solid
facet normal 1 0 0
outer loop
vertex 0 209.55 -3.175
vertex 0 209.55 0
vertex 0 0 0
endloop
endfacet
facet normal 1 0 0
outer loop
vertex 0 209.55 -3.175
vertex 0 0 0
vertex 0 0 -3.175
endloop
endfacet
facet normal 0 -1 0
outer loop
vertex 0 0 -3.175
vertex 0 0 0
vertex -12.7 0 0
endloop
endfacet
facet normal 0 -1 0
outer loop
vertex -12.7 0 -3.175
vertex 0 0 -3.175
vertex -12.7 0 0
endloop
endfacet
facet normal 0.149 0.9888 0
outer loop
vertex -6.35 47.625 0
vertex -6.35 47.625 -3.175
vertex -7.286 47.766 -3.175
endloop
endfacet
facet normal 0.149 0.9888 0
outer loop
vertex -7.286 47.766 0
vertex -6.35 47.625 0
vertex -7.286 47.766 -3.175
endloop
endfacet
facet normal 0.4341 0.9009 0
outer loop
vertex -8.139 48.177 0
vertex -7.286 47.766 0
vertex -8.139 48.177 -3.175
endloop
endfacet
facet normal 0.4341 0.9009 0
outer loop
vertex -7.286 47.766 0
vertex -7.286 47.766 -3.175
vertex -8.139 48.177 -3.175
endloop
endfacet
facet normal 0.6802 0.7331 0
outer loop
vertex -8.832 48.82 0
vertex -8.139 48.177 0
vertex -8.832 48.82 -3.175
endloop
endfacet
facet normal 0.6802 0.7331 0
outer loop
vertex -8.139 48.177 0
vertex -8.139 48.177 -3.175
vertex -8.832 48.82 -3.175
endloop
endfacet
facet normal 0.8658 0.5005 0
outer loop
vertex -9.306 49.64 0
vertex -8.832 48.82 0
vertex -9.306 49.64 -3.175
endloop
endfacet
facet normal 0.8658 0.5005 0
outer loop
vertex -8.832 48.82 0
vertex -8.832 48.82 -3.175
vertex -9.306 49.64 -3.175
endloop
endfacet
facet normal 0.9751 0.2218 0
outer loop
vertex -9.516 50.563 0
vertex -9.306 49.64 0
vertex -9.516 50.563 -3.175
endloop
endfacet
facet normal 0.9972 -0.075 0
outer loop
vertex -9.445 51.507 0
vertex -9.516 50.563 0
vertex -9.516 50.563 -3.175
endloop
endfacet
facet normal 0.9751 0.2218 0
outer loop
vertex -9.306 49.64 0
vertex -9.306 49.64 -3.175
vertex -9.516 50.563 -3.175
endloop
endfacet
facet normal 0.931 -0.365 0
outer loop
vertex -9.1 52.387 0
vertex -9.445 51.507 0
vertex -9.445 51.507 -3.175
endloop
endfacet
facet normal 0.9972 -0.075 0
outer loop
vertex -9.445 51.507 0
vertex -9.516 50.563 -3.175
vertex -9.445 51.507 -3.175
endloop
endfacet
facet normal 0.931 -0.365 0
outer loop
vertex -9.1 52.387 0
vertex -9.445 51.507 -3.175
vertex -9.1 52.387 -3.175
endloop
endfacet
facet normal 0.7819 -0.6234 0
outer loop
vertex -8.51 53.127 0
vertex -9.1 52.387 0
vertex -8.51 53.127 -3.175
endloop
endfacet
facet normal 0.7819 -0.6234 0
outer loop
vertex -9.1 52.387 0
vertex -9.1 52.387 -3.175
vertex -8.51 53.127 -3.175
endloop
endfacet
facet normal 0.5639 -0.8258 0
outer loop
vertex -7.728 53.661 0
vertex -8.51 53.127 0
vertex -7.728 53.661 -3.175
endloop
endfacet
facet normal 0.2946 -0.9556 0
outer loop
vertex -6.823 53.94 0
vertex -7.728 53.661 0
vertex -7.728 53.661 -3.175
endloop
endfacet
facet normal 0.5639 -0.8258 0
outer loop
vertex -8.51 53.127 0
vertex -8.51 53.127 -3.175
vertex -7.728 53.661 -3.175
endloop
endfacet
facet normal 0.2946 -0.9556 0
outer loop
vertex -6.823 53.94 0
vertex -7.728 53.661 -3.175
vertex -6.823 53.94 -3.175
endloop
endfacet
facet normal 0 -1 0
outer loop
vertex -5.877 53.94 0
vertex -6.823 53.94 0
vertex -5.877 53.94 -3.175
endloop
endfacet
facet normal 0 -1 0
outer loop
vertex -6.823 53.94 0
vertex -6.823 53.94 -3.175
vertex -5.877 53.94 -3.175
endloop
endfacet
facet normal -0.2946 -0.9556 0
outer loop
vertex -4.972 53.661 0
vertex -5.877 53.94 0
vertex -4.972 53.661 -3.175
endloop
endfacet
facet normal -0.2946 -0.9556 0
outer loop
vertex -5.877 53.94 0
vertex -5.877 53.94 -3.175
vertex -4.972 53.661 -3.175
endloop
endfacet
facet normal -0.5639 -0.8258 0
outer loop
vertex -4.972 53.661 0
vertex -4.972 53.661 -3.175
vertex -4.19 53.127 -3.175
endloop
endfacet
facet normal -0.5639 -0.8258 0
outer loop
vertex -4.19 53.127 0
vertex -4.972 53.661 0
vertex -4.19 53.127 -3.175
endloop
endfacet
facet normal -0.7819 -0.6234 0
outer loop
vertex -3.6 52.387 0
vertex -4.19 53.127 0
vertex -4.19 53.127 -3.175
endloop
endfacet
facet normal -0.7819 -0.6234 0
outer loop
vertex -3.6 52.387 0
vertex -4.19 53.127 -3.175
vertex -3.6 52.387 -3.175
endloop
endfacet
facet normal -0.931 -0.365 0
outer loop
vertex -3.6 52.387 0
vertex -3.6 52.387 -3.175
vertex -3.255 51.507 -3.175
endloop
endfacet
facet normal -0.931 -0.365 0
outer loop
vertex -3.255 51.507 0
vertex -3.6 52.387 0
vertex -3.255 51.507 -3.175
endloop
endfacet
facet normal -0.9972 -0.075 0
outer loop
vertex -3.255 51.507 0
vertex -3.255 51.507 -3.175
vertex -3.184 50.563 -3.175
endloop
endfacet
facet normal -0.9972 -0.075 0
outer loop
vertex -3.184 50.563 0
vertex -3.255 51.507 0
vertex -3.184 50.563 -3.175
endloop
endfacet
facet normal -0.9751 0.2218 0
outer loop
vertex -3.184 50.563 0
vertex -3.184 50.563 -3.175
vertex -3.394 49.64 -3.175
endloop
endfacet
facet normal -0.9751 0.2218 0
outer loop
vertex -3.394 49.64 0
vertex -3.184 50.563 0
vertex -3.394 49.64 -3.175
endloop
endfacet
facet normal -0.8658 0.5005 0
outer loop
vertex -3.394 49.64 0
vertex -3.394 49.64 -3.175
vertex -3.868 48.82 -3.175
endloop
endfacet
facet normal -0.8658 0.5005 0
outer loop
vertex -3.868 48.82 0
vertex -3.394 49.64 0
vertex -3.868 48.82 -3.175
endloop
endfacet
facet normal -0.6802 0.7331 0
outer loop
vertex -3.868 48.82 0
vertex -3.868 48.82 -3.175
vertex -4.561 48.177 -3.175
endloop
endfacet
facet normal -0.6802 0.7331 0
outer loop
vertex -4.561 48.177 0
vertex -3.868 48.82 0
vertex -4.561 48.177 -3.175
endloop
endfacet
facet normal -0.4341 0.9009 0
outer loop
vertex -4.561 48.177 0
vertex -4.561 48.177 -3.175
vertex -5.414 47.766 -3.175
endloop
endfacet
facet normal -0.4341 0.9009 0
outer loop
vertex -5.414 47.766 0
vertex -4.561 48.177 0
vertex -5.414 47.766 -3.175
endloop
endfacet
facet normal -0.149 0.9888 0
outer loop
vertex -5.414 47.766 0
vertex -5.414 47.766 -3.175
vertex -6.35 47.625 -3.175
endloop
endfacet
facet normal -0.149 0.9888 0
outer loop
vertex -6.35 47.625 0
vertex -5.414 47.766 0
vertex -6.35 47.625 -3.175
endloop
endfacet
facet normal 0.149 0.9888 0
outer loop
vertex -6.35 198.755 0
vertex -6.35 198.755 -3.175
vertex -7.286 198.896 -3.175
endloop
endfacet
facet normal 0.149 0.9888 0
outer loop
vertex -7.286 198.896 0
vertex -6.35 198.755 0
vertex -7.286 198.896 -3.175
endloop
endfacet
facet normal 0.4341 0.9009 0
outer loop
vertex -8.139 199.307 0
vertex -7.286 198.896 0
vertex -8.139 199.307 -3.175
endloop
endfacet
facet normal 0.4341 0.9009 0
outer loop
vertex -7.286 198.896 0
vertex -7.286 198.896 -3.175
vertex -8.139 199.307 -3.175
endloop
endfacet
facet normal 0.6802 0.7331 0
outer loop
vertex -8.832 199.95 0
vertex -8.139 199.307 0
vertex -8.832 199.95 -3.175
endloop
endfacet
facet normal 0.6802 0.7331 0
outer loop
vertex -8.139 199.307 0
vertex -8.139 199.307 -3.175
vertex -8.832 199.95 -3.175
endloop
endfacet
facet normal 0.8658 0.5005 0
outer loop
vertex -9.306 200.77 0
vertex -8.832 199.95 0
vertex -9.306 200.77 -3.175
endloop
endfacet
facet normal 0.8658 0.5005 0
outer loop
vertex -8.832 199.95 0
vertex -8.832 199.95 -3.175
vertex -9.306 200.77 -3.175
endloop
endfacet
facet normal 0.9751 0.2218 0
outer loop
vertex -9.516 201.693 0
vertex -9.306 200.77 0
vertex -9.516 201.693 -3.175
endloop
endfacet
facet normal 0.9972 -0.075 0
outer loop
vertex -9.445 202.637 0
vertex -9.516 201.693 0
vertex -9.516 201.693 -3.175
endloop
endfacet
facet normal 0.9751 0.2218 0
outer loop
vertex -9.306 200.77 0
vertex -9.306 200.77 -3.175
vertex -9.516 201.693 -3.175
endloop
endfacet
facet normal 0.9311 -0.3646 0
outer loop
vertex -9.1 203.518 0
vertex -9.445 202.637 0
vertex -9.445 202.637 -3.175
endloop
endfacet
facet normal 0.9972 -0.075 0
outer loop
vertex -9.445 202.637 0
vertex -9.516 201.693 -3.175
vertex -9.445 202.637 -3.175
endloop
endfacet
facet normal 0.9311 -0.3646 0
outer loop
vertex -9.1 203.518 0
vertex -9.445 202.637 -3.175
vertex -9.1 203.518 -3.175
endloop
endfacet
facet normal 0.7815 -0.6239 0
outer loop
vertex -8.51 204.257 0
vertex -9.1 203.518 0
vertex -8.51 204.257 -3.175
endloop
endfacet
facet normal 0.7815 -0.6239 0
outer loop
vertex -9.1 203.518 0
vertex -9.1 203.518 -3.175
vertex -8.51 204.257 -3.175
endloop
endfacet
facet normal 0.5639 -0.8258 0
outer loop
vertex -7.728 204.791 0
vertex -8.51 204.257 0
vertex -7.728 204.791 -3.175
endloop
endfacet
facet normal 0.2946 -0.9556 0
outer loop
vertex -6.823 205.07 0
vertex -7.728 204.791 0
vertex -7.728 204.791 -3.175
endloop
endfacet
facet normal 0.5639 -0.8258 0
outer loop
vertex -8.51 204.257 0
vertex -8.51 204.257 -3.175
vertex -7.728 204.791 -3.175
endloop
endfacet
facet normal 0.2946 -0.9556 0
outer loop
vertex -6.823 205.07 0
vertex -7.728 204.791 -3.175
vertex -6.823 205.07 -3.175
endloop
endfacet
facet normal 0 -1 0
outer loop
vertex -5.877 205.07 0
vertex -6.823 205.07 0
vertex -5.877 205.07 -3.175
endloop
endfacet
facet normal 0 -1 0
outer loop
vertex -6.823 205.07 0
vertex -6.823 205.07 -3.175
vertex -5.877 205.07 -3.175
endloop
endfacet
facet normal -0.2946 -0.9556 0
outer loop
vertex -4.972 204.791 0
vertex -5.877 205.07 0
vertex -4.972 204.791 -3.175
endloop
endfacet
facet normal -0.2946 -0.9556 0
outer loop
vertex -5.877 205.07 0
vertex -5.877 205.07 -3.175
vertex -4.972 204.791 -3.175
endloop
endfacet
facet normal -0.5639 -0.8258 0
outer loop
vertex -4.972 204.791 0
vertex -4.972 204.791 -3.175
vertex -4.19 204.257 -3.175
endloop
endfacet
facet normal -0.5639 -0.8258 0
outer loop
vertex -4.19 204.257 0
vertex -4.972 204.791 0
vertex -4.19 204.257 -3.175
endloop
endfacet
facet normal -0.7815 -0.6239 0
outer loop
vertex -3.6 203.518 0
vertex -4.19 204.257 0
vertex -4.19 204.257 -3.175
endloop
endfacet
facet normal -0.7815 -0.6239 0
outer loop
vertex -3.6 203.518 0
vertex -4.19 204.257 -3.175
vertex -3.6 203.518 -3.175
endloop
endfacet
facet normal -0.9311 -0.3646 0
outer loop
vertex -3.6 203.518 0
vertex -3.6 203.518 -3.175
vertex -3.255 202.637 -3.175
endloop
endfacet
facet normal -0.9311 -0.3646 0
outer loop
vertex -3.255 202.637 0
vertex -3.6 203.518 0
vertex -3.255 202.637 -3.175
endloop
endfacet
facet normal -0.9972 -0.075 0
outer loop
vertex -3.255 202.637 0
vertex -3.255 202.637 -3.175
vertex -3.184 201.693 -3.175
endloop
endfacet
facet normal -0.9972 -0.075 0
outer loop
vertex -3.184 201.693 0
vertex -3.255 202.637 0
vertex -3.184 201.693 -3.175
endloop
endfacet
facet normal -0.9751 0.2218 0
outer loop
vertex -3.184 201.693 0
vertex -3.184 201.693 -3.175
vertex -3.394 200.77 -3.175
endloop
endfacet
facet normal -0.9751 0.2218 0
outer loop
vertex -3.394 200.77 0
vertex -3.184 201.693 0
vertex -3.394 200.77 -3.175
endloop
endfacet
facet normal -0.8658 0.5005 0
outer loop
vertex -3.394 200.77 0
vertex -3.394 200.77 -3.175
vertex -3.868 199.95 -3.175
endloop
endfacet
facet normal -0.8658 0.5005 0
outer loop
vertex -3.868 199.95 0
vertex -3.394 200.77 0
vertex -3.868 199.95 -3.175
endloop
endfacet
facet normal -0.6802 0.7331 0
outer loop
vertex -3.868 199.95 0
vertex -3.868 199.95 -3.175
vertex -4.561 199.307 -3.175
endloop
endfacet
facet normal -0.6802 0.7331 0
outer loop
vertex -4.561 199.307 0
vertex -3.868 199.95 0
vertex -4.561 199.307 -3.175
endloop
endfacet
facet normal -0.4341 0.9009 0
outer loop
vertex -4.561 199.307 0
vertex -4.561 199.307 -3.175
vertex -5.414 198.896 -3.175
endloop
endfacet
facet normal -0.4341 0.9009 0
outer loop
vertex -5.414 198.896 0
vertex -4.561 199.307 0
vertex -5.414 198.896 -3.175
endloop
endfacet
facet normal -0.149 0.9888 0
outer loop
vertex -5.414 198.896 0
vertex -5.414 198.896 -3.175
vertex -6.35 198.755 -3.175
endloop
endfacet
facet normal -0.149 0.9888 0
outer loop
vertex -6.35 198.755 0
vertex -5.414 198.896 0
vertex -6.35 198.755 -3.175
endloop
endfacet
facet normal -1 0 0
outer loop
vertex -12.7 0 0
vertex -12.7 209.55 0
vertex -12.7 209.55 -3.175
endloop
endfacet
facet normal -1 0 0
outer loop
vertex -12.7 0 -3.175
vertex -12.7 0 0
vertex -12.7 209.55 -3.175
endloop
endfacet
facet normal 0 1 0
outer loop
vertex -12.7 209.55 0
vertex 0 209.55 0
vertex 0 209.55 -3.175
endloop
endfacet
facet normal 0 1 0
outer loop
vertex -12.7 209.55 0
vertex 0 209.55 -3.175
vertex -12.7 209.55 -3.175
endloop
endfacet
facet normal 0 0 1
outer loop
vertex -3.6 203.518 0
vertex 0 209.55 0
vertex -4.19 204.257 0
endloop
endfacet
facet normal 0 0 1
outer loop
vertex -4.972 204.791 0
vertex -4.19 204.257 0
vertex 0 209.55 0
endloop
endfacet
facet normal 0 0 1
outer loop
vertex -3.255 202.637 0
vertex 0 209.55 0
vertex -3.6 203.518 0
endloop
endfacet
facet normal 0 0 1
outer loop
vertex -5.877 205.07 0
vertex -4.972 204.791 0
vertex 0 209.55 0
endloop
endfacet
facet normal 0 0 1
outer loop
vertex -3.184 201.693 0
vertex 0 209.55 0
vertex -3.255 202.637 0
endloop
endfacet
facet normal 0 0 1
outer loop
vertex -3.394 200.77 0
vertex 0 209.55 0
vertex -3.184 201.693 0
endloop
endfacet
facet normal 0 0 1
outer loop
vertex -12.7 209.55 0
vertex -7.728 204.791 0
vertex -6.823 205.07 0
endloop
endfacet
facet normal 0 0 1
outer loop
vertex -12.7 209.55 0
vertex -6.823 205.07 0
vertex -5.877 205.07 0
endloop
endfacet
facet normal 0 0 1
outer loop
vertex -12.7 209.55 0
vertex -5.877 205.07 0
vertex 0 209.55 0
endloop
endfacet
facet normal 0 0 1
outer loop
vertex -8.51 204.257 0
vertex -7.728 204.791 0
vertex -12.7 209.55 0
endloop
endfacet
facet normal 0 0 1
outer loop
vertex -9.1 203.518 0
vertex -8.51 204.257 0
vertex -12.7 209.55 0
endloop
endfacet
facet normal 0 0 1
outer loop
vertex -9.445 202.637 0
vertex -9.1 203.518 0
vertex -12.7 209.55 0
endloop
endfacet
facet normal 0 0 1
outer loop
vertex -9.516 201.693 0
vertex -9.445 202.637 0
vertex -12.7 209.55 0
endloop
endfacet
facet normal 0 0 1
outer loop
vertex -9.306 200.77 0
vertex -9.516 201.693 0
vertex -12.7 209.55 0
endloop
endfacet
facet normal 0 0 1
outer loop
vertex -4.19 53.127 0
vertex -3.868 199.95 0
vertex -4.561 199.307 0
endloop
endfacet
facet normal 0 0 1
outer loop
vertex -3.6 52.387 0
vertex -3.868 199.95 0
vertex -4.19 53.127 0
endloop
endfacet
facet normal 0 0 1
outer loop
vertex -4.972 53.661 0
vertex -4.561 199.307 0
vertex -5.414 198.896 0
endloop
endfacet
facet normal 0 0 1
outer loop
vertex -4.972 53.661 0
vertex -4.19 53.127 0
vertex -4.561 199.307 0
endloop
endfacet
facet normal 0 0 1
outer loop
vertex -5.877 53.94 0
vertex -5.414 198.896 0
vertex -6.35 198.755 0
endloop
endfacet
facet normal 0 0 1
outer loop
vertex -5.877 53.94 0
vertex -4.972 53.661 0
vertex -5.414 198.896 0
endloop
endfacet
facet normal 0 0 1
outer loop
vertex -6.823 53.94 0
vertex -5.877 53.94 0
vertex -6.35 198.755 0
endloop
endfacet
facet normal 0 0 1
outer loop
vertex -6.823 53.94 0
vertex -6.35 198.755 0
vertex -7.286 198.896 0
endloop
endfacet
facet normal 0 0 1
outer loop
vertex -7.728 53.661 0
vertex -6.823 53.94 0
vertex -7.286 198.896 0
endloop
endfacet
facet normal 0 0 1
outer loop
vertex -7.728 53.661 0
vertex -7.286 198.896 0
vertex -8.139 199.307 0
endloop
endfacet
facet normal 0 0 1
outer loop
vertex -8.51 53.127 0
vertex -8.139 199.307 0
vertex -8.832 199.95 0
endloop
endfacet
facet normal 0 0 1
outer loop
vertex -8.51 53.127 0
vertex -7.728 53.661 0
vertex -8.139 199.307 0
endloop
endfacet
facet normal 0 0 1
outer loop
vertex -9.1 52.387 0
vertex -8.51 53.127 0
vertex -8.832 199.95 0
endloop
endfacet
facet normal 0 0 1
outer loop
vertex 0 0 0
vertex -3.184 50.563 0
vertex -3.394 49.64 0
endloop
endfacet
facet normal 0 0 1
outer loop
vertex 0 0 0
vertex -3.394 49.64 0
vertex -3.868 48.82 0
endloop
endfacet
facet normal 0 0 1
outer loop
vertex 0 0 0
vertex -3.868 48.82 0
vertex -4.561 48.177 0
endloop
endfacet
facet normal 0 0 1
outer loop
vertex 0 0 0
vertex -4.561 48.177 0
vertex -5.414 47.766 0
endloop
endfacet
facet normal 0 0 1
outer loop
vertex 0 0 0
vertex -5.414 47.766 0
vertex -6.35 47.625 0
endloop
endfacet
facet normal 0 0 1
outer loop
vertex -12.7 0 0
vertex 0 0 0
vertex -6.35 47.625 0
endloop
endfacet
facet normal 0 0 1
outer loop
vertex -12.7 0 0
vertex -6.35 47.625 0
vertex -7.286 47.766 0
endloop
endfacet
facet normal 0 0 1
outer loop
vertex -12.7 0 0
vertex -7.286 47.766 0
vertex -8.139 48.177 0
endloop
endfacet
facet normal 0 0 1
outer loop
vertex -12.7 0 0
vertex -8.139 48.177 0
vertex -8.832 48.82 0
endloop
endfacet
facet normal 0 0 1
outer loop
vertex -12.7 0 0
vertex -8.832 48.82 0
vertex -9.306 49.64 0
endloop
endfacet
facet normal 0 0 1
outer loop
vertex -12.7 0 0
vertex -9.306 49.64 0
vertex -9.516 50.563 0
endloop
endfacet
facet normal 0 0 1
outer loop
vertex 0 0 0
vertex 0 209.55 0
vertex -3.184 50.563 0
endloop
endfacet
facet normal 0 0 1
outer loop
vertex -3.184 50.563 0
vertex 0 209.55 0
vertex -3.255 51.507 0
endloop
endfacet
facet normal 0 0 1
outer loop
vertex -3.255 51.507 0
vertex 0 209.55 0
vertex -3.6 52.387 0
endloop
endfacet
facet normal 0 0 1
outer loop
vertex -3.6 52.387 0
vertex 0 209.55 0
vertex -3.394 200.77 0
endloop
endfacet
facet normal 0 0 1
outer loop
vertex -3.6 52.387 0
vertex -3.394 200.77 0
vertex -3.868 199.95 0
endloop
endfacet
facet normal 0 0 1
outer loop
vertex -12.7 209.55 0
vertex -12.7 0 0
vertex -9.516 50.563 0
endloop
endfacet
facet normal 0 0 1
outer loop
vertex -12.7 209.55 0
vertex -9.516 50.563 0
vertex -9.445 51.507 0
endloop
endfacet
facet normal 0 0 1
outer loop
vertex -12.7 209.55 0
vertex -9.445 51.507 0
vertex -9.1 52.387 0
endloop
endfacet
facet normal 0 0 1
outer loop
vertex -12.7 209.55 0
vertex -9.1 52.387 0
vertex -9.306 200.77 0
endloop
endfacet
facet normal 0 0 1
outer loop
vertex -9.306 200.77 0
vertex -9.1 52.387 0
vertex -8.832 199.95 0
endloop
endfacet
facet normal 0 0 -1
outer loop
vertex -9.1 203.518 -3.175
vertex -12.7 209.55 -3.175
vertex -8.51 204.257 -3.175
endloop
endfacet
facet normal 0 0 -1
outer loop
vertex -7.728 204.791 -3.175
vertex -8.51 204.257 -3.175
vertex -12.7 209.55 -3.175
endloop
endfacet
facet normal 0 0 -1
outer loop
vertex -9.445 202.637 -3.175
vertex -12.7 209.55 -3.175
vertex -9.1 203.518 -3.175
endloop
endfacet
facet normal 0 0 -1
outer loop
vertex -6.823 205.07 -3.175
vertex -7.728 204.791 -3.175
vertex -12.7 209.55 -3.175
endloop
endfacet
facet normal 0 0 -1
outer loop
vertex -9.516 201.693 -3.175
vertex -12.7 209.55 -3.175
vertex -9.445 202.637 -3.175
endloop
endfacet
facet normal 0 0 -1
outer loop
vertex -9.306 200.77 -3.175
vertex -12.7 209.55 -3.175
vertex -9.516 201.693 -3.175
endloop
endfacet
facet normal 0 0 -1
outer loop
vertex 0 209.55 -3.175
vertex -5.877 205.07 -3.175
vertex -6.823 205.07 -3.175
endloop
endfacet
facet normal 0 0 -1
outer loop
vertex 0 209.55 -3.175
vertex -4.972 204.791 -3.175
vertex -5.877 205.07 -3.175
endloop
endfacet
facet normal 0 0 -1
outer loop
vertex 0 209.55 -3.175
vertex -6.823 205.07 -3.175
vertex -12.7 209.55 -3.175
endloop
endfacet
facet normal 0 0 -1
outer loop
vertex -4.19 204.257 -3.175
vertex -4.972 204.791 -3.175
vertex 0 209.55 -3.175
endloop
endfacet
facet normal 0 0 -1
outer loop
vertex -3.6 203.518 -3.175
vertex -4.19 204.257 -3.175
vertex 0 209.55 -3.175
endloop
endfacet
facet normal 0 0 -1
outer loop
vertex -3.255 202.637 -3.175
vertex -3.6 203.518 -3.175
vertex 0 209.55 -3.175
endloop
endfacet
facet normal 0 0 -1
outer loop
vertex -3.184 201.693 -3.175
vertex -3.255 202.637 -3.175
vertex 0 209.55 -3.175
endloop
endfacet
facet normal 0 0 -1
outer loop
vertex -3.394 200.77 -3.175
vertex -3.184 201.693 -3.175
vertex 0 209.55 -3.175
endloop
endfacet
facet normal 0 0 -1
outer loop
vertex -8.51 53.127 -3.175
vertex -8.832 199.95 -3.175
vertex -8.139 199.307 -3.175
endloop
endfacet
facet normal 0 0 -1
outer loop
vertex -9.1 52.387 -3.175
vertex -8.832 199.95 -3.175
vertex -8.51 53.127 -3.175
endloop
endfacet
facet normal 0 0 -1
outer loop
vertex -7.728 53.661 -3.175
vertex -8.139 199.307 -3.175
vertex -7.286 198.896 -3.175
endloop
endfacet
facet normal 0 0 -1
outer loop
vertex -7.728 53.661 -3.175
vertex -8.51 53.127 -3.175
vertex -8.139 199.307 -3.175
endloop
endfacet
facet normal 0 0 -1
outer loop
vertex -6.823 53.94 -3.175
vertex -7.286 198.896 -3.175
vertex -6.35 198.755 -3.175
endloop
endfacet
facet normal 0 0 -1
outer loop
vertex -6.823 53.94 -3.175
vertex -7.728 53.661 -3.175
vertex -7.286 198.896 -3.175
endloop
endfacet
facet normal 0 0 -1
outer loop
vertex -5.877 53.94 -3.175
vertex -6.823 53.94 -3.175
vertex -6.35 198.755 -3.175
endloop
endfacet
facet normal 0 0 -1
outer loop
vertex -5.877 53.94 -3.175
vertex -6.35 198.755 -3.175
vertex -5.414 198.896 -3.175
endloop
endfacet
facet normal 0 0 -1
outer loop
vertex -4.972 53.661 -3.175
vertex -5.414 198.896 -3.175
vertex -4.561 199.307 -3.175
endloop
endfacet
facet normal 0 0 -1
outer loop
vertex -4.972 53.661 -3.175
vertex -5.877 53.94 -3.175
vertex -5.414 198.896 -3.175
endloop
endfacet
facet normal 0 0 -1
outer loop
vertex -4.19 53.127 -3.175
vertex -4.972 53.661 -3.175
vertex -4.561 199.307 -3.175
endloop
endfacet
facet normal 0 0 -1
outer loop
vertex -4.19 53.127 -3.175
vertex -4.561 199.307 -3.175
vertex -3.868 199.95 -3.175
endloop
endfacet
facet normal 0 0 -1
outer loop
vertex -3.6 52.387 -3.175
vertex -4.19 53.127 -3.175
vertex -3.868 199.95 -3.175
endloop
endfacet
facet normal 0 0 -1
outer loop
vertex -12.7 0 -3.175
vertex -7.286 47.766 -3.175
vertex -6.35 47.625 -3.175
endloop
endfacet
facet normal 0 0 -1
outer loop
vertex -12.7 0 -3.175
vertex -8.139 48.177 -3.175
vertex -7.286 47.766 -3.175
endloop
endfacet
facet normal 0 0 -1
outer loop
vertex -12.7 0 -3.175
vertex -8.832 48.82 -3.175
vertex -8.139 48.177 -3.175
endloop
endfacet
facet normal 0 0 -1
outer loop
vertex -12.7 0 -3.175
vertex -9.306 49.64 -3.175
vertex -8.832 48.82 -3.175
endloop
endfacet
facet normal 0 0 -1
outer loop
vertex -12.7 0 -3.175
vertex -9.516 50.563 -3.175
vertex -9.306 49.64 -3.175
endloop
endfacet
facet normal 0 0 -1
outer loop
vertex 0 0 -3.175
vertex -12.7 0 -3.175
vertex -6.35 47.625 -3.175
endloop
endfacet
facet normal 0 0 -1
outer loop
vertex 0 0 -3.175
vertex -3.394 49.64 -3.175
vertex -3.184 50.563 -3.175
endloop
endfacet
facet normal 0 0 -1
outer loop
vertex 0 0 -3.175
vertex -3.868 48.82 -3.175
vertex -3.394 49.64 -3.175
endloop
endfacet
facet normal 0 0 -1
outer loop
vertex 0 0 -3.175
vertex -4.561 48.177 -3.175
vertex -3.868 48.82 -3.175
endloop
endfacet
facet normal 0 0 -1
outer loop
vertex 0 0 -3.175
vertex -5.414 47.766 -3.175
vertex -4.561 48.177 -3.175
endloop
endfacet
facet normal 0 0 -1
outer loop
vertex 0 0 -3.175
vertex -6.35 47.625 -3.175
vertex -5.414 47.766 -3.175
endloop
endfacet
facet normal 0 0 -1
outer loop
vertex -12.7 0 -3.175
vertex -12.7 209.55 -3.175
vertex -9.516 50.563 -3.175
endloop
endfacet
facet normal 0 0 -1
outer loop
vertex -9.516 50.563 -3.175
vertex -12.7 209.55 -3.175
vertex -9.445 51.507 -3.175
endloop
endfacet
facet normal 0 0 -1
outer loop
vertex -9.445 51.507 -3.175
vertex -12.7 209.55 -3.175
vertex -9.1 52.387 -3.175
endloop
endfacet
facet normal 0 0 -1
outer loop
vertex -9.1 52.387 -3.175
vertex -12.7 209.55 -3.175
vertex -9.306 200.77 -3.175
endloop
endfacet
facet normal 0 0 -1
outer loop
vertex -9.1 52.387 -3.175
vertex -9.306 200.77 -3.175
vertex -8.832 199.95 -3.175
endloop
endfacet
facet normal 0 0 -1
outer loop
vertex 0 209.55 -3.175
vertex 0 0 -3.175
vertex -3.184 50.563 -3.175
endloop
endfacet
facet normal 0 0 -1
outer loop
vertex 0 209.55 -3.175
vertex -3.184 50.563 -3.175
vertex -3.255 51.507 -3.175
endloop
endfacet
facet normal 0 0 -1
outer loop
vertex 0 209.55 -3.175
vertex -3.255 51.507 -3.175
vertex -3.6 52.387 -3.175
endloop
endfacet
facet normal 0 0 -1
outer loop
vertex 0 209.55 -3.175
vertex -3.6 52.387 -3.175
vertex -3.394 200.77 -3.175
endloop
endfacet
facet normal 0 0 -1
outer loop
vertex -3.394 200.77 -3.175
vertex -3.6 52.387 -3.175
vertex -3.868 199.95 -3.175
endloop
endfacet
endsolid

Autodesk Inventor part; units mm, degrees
ref_plane "YZ Plane" through (0, 0, 0) normal (1, 0, 0) x (0, 1, 0)
ref_plane "XZ Plane" through (0, 0, 0) normal (0, 1, 0) x (-1, 0, 0)
ref_plane "XY Plane" through (0, 0, 0) normal (0, 0, 1) x (1, 0, 0)
sketch "Sketch1" plane through (0, 0, 0) normal (0, 1, 0) x (-1, 0, 0)
  line L0 (0, 0) -> (12.7, 0)
  line L1 (0, 0) -> (0, -3.175)
  line L2 (12.7, 0) -> (12.7, -3.175)
  line L3 (12.7, -3.175) -> (0, -3.175)
  dimension "d2" = 3.175
  dimension "d3" = 12.7
extrude "Extrusion1" add sketch "Sketch1" along normal blind 209.55
sketch "Sketch2" plane through (-12.7, 0, 0) normal (0, 0, 1) x (1, 0, 0)
  line L0 (0, 209.55) -> (12.7, 209.55) projected
  line L1 (0, 0) -> (0, 209.55) projected
  line L2 (12.7, 0) -> (0, 0) projected
  point P0 (6.35, 201.93)
  point P1 (6.35, 50.8)
  dimension "d6" = 7.62
  dimension "d7" = 6.35
  dimension "d8" = 50.8
  dimension "d9" = 6.35
hole "Hole1" at (-6.35, 201.93, 0) at (-6.35, 50.8, 0) direction (0, 0, -1) diameter 6.35 end through all
properties part number "grabber articulation arms"
